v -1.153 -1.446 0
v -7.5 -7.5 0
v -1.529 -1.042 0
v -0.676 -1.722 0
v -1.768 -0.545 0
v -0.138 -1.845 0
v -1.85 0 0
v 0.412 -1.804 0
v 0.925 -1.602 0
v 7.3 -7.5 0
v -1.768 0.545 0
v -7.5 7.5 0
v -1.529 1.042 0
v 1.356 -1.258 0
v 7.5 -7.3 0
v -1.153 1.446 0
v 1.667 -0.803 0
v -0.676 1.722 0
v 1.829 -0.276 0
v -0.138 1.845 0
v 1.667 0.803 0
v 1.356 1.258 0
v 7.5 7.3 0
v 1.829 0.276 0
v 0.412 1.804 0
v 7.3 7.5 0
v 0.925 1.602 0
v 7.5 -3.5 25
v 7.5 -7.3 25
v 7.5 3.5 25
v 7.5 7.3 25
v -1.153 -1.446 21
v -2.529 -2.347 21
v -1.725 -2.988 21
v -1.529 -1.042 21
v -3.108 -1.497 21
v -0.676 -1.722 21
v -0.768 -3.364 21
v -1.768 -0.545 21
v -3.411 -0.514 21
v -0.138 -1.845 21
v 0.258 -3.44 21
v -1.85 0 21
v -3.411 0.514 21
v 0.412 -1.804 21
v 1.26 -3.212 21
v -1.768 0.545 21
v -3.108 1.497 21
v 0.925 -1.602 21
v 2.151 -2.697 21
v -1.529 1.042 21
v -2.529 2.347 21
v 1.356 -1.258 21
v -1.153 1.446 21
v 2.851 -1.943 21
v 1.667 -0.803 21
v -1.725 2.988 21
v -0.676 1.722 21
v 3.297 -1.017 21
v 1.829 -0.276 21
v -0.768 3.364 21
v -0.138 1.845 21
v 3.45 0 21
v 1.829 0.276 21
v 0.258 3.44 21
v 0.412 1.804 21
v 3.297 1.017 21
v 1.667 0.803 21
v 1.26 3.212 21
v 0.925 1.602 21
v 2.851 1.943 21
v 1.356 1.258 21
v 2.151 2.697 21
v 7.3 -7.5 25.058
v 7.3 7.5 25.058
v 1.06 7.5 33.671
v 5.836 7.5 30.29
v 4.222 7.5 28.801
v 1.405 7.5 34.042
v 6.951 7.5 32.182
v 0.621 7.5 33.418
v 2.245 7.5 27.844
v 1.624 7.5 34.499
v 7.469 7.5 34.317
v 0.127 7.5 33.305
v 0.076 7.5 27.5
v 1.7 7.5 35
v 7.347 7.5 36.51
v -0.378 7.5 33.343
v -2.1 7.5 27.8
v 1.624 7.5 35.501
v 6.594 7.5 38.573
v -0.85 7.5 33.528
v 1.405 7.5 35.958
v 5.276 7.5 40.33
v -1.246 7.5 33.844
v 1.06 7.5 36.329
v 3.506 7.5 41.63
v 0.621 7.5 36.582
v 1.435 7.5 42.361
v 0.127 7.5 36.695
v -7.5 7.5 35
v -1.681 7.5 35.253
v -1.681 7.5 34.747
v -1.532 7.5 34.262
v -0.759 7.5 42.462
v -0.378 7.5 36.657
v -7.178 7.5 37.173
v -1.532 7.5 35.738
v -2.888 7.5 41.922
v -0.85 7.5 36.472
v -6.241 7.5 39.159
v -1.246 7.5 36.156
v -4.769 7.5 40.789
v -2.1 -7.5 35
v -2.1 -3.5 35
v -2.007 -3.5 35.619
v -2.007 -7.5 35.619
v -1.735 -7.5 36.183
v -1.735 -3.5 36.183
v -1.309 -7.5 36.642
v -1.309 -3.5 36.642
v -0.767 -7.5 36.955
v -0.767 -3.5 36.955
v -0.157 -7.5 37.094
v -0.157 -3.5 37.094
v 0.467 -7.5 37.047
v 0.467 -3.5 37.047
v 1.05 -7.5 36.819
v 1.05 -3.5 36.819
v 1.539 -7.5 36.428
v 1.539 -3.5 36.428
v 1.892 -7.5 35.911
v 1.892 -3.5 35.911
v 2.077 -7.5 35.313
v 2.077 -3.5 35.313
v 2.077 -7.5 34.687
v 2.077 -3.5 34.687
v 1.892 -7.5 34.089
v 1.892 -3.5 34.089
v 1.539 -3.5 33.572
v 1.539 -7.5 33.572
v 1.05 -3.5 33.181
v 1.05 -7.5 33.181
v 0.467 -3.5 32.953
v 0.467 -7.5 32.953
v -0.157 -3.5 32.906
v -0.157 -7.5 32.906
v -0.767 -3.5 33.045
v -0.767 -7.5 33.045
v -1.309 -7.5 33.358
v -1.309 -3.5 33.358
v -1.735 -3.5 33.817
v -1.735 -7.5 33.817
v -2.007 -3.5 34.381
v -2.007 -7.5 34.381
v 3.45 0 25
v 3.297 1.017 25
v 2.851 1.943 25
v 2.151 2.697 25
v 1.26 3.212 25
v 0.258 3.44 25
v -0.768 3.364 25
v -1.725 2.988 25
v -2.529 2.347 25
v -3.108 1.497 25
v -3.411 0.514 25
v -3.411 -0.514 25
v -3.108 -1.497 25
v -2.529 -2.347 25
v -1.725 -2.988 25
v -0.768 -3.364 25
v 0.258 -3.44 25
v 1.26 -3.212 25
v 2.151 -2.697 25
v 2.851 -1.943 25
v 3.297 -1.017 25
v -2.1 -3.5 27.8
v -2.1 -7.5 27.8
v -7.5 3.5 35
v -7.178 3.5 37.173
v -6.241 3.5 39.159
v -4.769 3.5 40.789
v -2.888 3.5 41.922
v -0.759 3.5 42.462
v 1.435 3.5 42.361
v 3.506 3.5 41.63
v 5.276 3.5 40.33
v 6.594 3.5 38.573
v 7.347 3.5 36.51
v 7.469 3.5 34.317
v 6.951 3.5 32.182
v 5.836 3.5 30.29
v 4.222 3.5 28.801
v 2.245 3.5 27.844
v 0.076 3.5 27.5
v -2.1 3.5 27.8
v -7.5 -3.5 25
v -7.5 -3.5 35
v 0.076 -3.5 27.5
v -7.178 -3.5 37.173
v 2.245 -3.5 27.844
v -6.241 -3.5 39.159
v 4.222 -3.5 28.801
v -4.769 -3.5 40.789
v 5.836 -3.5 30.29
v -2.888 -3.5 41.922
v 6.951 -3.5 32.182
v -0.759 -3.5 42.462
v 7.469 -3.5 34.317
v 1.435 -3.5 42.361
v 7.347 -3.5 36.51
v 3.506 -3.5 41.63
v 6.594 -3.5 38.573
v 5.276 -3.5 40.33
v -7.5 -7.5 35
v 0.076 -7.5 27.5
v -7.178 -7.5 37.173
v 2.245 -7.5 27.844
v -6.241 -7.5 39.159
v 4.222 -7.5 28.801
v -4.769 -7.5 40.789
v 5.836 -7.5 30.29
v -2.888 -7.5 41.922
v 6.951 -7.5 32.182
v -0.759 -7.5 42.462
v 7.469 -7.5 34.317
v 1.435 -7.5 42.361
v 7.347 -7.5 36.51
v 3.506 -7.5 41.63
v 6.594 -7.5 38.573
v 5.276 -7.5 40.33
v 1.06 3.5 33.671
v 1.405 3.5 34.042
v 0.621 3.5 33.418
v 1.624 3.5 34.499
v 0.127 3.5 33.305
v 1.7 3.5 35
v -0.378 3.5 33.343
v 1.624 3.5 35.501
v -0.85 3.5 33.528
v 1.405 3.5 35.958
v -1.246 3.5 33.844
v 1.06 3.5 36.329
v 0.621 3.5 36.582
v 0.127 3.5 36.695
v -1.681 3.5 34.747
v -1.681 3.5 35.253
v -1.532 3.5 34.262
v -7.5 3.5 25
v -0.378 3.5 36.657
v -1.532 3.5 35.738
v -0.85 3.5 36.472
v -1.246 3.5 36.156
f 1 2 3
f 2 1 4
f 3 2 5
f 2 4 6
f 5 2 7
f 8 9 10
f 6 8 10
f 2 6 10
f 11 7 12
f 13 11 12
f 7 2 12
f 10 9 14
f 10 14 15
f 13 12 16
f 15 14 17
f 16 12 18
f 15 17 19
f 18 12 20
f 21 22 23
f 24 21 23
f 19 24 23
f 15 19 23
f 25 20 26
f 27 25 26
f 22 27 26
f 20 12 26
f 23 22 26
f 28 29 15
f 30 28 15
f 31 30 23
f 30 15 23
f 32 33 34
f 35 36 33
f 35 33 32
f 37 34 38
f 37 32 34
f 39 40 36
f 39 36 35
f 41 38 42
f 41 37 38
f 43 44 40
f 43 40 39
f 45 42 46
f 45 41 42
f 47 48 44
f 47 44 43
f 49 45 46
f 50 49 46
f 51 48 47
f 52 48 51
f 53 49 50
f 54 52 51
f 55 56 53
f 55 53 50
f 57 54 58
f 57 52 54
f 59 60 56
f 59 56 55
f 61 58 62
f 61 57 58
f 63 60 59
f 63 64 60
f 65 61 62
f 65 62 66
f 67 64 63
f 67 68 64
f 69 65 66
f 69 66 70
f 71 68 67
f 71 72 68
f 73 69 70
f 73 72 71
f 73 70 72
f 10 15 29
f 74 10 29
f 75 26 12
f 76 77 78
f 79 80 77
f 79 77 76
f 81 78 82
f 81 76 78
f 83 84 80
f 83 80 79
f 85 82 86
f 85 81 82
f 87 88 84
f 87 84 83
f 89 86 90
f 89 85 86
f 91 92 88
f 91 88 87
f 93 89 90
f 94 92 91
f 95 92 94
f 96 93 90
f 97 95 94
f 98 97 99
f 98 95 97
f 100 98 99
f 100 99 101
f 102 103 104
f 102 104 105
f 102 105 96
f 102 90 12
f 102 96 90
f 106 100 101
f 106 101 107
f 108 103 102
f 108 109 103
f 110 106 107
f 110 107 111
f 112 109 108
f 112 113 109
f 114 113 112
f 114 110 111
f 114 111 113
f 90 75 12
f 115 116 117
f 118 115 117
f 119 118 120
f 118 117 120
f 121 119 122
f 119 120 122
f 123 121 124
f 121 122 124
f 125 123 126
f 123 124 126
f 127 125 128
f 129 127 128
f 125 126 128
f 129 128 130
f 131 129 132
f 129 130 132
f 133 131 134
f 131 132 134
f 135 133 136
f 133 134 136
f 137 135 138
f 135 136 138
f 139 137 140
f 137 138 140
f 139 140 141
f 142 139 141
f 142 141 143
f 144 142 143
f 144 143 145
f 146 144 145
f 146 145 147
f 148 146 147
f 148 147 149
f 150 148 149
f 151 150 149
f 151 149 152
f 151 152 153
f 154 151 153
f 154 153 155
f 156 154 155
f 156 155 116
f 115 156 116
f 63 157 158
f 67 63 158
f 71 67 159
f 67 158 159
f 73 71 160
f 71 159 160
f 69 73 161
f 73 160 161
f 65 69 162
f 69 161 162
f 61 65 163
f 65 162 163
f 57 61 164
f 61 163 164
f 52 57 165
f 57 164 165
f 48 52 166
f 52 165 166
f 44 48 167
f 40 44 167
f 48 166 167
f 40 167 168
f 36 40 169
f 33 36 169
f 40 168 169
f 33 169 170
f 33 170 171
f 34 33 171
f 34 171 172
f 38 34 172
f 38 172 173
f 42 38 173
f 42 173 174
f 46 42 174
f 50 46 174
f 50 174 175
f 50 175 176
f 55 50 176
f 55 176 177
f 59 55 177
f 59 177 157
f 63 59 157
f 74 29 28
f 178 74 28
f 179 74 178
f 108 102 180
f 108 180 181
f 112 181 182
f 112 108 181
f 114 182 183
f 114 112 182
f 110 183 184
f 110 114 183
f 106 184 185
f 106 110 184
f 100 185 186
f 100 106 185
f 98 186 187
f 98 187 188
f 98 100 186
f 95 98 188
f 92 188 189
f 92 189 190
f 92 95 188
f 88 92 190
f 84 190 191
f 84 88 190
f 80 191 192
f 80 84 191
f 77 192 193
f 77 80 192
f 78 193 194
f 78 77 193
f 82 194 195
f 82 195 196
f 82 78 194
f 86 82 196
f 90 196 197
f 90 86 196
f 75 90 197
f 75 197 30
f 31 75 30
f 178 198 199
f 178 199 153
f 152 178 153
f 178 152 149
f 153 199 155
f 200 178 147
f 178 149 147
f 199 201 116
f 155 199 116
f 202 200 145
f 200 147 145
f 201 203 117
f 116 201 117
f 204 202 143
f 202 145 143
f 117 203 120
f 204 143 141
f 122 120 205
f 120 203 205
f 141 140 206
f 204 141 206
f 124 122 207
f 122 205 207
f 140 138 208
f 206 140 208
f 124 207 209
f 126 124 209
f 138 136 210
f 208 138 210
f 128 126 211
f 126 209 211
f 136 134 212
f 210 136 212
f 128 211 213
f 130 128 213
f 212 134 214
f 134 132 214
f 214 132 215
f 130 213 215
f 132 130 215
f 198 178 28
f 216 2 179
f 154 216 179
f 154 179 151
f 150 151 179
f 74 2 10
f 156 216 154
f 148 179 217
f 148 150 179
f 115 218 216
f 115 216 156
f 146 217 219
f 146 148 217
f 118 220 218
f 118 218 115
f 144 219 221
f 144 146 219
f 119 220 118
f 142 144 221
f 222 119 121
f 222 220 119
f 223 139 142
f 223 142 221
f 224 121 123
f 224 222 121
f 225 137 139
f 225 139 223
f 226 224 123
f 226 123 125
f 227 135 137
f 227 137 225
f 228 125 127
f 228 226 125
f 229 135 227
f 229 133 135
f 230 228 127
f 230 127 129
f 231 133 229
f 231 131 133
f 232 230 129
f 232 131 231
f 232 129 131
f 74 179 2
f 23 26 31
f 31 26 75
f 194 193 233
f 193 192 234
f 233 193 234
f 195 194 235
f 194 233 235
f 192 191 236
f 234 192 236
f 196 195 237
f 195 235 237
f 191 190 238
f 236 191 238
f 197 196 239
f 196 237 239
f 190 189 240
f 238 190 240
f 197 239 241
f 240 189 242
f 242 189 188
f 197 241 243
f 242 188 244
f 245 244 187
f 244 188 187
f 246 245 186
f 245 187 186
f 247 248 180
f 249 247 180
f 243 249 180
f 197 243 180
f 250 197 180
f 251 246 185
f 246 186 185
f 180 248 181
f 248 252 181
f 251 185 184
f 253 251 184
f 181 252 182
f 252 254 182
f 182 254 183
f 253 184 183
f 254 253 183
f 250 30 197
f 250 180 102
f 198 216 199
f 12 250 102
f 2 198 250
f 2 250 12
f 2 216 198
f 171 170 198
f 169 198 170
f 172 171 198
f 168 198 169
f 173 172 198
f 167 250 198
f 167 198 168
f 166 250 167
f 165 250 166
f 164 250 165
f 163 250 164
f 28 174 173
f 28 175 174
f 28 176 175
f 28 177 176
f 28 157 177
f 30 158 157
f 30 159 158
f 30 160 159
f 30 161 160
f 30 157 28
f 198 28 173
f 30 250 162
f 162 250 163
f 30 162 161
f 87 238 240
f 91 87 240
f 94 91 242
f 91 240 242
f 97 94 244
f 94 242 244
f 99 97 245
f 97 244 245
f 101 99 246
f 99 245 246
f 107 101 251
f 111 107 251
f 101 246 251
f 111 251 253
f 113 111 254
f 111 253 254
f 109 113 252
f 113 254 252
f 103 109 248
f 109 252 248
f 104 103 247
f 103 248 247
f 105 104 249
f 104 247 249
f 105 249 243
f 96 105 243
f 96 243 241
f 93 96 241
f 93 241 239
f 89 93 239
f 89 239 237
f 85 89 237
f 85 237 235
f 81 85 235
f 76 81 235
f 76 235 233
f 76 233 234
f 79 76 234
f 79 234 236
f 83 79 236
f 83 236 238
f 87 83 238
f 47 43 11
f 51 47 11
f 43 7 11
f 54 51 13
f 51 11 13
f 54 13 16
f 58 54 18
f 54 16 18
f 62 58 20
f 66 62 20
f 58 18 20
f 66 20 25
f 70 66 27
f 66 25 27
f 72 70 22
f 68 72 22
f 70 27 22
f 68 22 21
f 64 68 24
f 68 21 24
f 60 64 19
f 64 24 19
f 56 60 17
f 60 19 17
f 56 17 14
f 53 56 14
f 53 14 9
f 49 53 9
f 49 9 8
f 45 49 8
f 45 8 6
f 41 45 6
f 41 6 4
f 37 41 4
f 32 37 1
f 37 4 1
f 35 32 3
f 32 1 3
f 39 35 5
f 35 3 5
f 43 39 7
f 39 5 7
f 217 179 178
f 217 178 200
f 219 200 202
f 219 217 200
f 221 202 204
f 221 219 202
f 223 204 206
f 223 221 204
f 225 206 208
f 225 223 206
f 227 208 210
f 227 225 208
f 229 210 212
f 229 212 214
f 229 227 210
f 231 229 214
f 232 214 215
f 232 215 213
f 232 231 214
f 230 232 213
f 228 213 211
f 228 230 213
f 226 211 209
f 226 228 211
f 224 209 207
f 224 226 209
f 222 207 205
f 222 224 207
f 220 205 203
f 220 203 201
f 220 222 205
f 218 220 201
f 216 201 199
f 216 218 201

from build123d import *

# Parameters (mm, degrees)
F1_DEPTH       = 25
F3_D           = 3.7
F3_CBORE_D     = 6.9
F3_CBORE_DEPTH = 4
F5_DEPTH       = 4
F7_DEPTH       = 4
F9_D           = 4.2
F9_DEPTH       = 4
F11_D          = 3.4
F11_DEPTH      = 4
F12_SIZE       = 0.2


with BuildPart() as f1:
    # F0 (on Top) → F1 (new body)
    with BuildSketch(Plane.XY):
        Polygon((7.5, -7.5), (7.5, 0), (7.5, 7.5), (-7.5, 7.5), (-7.5, -7.5), align=None)
    extrude(amount=F1_DEPTH)

    # F3 (through all)
    with Locations(Plane.XY.offset(25)):
        with Locations((0, 0)):
            CounterBoreHole(F3_D / 2, F3_CBORE_D / 2, F3_CBORE_DEPTH)

    # F4 (on face) → F5 (join)
    with BuildSketch(Plane(origin=(0, 7.5, 0), x_dir=(-1, 0, 0), z_dir=(0, 1, 0))):
        with BuildLine():
            Line((-7.5, 25), (7.5, 25))
            Line((7.5, 25), (7.5, 35))
            ThreePointArc((7.5, 35), (6, 30.5), (2.1, 27.8))
            Line((2.1, 27.8), (-7.5, 25))
        make_face()
        with BuildLine():
            ThreePointArc((2.1, 27.8), (6, 30.5), (7.5, 35))
            ThreePointArc((7.5, 35), (-6, 39.5), (2.1, 27.8))
        make_face()
    extrude(amount=-F5_DEPTH)

    # F6 (on face) → F7 (join)
    with BuildSketch(Plane.XZ.offset(7.5)):
        with BuildLine():
            ThreePointArc((7.5, 35), (0, 42.5), (-7.5, 35))
            ThreePointArc((-7.5, 35), (-6, 30.5), (-2.1, 27.8))
            ThreePointArc((-2.1, 27.8), (4.5, 29), (7.5, 35))
        make_face()
        with BuildLine():
            Line((-7.5, 35), (-7.5, 25))
            Line((-7.5, 25), (7.5, 25))
            Line((7.5, 25), (-2.1, 27.8))
            ThreePointArc((-2.1, 27.8), (-6, 30.5), (-7.5, 35))
        make_face()
    extrude(amount=-F7_DEPTH)

    # F9
    with Locations(Plane.XZ.offset(7.5)):
        with Locations((0, 35)):
            Hole(F9_D / 2, depth=F9_DEPTH)

    # F11
    with Locations(Plane(origin=(0, 7.5, 0), x_dir=(-1, 0, 0), z_dir=(0, 1, 0))):
        with Locations((0, 35)):
            Hole(F11_D / 2, depth=F11_DEPTH)

    # F12
    f12_edges = [f1.edges().sort_by_distance(p)[0] for p in [
        (7.5, -7.5, 12.5),
        (7.5, 7.5, 12.5),
    ]]
    chamfer(f12_edges, length=F12_SIZE)


solid = f1.part
